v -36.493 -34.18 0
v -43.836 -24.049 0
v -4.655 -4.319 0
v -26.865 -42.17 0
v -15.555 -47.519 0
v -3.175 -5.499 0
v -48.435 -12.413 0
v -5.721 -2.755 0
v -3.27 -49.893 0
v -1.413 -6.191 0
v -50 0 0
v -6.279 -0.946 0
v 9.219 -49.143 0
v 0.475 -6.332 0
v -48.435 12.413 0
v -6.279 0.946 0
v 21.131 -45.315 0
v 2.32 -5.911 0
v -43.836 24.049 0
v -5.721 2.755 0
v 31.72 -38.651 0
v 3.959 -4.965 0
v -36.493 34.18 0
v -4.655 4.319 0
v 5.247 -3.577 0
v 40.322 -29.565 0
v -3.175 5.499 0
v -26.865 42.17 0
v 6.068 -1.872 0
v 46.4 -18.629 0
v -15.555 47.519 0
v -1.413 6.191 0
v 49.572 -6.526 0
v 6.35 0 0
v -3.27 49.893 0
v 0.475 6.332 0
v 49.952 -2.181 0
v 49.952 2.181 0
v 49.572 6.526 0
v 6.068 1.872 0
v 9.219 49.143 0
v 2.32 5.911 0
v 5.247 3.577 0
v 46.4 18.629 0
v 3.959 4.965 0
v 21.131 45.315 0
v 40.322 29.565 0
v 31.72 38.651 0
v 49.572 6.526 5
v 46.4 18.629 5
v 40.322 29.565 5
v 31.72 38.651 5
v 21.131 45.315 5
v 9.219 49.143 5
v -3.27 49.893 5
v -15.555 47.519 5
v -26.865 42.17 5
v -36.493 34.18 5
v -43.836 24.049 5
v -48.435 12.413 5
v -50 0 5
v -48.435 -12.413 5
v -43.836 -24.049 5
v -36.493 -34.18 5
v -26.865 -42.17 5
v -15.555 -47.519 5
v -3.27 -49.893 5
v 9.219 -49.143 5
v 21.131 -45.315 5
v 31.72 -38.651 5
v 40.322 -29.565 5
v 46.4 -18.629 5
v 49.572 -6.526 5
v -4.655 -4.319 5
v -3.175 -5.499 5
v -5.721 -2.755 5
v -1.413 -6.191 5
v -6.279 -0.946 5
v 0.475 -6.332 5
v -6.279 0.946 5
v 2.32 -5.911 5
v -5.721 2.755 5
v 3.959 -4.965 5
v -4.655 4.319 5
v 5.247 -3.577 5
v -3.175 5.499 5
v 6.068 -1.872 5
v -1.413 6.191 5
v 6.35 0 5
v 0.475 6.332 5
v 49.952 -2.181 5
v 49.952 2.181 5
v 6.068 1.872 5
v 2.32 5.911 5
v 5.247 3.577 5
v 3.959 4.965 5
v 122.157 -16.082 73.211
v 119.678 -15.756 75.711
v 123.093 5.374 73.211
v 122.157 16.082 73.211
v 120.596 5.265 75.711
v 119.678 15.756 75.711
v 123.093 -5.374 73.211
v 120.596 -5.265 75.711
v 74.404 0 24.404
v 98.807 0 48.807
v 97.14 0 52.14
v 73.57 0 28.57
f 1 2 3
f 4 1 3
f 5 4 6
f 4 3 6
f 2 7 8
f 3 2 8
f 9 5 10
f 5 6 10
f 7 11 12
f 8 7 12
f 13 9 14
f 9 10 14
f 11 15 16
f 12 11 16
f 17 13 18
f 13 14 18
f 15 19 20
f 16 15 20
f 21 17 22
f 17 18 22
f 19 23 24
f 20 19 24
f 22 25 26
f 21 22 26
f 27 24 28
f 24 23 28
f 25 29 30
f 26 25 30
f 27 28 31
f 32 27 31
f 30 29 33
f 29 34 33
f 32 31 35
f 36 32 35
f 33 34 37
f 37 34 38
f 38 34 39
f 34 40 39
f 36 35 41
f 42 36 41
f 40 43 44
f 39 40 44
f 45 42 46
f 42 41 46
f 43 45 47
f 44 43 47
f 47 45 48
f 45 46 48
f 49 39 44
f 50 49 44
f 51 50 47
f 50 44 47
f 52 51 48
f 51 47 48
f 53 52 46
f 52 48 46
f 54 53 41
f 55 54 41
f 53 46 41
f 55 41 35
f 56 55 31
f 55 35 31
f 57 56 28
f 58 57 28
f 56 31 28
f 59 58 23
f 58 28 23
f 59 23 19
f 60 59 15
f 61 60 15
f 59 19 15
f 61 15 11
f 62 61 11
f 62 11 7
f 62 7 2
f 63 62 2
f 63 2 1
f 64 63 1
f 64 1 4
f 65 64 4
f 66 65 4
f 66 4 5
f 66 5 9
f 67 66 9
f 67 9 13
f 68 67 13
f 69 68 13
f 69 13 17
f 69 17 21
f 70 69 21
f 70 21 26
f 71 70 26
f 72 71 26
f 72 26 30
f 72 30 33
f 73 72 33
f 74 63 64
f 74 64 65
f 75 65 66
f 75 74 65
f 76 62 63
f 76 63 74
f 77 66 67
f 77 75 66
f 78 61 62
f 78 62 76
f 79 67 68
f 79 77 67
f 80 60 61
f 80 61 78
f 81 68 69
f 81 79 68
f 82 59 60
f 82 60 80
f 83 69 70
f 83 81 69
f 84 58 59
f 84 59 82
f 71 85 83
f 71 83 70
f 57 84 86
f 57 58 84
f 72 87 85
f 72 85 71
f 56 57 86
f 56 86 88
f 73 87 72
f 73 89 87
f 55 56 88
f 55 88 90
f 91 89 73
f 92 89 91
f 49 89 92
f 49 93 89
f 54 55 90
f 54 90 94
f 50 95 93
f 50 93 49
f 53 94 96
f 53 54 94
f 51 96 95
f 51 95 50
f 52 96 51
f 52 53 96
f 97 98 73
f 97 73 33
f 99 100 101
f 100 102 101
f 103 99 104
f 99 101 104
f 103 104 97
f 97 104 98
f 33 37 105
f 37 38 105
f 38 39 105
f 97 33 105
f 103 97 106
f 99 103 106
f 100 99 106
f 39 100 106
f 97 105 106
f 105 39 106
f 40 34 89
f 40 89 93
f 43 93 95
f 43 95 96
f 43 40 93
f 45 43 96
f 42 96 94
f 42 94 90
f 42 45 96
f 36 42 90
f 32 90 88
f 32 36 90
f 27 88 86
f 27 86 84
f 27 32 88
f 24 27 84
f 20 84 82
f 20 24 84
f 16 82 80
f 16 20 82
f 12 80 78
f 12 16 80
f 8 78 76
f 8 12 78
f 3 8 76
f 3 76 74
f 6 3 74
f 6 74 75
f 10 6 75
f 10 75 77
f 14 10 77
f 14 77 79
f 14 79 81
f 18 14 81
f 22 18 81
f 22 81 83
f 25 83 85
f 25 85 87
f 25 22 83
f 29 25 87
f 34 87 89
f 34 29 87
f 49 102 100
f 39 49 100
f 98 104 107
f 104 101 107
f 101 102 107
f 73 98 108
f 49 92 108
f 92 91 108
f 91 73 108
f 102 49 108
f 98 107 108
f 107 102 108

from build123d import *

# Parameters (mm, degrees)
F0_R     = 50
F0_R_2   = 6.35
F1_DEPTH = 5
F3_ANGLE = 15


with BuildPart() as f1:
    # F0 (on Top) → F1 (new body)
    with BuildSketch(Plane.XY):
        Circle(F0_R)
        Circle(F0_R_2, mode=Mode.SUBTRACT)
    extrude(amount=F1_DEPTH)

    # F2 (on Front) → F3 (revolve, symmetric)
    with BuildSketch(Plane.XZ) as f3_sk:
        Polygon((120.710678, 75.710678), (50, 5), (50, 0), (123.210678, 73.210678), align=None)
    revolve(axis=Axis((0, 0, 11.425557), (0, 0, 1)), revolution_arc=F3_ANGLE / 2)
    revolve(f3_sk.sketch, axis=Axis((0, 0, 11.425557), (0, 0, -1)), revolution_arc=F3_ANGLE / 2)


solid = f1.part
